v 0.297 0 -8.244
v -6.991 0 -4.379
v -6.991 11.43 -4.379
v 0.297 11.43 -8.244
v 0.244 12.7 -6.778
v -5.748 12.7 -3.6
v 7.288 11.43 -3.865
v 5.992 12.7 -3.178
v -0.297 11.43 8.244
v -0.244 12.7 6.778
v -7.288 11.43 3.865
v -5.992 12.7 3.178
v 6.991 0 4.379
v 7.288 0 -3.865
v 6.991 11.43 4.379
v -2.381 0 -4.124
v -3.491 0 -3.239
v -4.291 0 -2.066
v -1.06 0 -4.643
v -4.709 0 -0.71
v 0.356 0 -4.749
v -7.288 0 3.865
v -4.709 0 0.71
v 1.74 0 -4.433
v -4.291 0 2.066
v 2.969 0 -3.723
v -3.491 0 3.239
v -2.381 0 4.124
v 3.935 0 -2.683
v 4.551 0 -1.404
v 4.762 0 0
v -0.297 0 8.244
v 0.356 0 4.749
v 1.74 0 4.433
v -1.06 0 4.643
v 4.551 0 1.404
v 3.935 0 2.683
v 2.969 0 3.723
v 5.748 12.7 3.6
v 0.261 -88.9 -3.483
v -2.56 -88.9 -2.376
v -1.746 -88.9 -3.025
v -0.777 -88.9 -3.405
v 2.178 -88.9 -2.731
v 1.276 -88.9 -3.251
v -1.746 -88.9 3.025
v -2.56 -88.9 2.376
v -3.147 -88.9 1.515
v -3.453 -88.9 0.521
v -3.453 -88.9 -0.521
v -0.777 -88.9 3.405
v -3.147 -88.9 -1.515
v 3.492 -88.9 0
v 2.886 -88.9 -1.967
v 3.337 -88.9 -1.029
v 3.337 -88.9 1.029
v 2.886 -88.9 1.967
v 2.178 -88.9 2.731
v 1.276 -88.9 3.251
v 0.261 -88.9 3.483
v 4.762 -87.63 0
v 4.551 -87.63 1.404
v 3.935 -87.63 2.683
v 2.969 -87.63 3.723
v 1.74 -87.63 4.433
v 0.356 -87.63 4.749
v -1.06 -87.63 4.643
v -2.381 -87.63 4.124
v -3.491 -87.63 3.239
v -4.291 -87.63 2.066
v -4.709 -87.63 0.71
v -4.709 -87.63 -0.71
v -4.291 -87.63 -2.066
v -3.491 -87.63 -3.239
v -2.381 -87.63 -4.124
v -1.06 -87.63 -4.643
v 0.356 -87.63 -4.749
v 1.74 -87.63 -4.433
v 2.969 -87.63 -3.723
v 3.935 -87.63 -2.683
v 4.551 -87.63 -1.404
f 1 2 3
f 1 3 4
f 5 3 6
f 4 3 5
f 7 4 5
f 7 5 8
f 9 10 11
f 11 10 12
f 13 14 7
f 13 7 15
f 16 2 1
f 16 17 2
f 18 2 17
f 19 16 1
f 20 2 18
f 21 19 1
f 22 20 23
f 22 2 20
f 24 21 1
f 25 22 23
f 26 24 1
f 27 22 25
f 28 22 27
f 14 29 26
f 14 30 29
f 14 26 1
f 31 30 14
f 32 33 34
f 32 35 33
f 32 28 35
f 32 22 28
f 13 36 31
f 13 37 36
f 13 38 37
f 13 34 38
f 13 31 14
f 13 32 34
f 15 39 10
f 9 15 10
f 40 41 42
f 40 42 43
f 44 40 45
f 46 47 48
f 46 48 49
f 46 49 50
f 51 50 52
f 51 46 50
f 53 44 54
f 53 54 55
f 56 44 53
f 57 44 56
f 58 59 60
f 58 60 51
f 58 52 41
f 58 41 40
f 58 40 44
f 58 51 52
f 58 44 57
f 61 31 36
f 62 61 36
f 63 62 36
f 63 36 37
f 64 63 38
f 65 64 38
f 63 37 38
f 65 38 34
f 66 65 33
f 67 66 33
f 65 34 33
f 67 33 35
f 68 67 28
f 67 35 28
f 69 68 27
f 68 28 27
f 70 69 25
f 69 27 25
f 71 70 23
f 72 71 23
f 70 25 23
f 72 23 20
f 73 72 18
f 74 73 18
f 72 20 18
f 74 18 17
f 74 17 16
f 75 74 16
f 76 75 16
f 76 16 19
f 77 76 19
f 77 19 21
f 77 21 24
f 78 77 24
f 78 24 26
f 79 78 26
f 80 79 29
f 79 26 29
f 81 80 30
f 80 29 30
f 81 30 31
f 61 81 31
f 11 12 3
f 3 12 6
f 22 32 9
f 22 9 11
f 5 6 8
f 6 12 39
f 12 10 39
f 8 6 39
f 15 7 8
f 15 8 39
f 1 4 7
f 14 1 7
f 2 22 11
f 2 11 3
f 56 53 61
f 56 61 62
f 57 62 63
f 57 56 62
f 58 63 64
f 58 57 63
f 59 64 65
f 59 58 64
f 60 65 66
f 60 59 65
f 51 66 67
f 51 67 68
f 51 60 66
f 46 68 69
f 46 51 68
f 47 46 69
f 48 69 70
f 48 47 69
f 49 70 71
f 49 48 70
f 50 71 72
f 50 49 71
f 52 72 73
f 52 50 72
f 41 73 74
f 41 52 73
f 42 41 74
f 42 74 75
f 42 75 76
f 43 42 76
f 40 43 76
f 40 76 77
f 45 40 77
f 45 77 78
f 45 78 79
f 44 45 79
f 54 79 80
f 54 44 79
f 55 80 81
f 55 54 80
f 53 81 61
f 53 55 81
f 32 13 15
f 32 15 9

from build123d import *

# Parameters (mm, degrees)
F1_DEPTH = 12.7
F2_R     = 4.7625
F3_DEPTH = 88.9
F4_SIZE  = 1.27


with BuildPart() as f1:
    # F0 (on Front) → F1 (new body)
    with BuildSketch(Plane.XZ):
        Polygon((-0.296798, 8.243551), (-7.287523, 3.864741), (-6.990725, -4.37881), (0.296798, -8.243551), (7.287523, -3.864741), (6.990725, 4.37881), align=None)
    extrude(amount=-F1_DEPTH)

    # F2 (on Front) → F3 (join)
    with BuildSketch(Plane.XZ):
        Circle(F2_R)
    extrude(amount=F3_DEPTH)

    # F4
    f4_edges = [f1.edges().sort_by_distance(p)[0] for p in [
        (-4.7625, -88.9, 0),
        (-7.139124, 12.7, -0.257035),
        (-3.346964, 12.7, -6.31118),
        (3.792161, 12.7, -6.054146),
        (7.139124, 12.7, 0.257035),
        (3.346964, 12.7, 6.31118),
        (-3.792161, 12.7, 6.054146),
    ]]
    chamfer(f4_edges, length=F4_SIZE)


solid = f1.part
